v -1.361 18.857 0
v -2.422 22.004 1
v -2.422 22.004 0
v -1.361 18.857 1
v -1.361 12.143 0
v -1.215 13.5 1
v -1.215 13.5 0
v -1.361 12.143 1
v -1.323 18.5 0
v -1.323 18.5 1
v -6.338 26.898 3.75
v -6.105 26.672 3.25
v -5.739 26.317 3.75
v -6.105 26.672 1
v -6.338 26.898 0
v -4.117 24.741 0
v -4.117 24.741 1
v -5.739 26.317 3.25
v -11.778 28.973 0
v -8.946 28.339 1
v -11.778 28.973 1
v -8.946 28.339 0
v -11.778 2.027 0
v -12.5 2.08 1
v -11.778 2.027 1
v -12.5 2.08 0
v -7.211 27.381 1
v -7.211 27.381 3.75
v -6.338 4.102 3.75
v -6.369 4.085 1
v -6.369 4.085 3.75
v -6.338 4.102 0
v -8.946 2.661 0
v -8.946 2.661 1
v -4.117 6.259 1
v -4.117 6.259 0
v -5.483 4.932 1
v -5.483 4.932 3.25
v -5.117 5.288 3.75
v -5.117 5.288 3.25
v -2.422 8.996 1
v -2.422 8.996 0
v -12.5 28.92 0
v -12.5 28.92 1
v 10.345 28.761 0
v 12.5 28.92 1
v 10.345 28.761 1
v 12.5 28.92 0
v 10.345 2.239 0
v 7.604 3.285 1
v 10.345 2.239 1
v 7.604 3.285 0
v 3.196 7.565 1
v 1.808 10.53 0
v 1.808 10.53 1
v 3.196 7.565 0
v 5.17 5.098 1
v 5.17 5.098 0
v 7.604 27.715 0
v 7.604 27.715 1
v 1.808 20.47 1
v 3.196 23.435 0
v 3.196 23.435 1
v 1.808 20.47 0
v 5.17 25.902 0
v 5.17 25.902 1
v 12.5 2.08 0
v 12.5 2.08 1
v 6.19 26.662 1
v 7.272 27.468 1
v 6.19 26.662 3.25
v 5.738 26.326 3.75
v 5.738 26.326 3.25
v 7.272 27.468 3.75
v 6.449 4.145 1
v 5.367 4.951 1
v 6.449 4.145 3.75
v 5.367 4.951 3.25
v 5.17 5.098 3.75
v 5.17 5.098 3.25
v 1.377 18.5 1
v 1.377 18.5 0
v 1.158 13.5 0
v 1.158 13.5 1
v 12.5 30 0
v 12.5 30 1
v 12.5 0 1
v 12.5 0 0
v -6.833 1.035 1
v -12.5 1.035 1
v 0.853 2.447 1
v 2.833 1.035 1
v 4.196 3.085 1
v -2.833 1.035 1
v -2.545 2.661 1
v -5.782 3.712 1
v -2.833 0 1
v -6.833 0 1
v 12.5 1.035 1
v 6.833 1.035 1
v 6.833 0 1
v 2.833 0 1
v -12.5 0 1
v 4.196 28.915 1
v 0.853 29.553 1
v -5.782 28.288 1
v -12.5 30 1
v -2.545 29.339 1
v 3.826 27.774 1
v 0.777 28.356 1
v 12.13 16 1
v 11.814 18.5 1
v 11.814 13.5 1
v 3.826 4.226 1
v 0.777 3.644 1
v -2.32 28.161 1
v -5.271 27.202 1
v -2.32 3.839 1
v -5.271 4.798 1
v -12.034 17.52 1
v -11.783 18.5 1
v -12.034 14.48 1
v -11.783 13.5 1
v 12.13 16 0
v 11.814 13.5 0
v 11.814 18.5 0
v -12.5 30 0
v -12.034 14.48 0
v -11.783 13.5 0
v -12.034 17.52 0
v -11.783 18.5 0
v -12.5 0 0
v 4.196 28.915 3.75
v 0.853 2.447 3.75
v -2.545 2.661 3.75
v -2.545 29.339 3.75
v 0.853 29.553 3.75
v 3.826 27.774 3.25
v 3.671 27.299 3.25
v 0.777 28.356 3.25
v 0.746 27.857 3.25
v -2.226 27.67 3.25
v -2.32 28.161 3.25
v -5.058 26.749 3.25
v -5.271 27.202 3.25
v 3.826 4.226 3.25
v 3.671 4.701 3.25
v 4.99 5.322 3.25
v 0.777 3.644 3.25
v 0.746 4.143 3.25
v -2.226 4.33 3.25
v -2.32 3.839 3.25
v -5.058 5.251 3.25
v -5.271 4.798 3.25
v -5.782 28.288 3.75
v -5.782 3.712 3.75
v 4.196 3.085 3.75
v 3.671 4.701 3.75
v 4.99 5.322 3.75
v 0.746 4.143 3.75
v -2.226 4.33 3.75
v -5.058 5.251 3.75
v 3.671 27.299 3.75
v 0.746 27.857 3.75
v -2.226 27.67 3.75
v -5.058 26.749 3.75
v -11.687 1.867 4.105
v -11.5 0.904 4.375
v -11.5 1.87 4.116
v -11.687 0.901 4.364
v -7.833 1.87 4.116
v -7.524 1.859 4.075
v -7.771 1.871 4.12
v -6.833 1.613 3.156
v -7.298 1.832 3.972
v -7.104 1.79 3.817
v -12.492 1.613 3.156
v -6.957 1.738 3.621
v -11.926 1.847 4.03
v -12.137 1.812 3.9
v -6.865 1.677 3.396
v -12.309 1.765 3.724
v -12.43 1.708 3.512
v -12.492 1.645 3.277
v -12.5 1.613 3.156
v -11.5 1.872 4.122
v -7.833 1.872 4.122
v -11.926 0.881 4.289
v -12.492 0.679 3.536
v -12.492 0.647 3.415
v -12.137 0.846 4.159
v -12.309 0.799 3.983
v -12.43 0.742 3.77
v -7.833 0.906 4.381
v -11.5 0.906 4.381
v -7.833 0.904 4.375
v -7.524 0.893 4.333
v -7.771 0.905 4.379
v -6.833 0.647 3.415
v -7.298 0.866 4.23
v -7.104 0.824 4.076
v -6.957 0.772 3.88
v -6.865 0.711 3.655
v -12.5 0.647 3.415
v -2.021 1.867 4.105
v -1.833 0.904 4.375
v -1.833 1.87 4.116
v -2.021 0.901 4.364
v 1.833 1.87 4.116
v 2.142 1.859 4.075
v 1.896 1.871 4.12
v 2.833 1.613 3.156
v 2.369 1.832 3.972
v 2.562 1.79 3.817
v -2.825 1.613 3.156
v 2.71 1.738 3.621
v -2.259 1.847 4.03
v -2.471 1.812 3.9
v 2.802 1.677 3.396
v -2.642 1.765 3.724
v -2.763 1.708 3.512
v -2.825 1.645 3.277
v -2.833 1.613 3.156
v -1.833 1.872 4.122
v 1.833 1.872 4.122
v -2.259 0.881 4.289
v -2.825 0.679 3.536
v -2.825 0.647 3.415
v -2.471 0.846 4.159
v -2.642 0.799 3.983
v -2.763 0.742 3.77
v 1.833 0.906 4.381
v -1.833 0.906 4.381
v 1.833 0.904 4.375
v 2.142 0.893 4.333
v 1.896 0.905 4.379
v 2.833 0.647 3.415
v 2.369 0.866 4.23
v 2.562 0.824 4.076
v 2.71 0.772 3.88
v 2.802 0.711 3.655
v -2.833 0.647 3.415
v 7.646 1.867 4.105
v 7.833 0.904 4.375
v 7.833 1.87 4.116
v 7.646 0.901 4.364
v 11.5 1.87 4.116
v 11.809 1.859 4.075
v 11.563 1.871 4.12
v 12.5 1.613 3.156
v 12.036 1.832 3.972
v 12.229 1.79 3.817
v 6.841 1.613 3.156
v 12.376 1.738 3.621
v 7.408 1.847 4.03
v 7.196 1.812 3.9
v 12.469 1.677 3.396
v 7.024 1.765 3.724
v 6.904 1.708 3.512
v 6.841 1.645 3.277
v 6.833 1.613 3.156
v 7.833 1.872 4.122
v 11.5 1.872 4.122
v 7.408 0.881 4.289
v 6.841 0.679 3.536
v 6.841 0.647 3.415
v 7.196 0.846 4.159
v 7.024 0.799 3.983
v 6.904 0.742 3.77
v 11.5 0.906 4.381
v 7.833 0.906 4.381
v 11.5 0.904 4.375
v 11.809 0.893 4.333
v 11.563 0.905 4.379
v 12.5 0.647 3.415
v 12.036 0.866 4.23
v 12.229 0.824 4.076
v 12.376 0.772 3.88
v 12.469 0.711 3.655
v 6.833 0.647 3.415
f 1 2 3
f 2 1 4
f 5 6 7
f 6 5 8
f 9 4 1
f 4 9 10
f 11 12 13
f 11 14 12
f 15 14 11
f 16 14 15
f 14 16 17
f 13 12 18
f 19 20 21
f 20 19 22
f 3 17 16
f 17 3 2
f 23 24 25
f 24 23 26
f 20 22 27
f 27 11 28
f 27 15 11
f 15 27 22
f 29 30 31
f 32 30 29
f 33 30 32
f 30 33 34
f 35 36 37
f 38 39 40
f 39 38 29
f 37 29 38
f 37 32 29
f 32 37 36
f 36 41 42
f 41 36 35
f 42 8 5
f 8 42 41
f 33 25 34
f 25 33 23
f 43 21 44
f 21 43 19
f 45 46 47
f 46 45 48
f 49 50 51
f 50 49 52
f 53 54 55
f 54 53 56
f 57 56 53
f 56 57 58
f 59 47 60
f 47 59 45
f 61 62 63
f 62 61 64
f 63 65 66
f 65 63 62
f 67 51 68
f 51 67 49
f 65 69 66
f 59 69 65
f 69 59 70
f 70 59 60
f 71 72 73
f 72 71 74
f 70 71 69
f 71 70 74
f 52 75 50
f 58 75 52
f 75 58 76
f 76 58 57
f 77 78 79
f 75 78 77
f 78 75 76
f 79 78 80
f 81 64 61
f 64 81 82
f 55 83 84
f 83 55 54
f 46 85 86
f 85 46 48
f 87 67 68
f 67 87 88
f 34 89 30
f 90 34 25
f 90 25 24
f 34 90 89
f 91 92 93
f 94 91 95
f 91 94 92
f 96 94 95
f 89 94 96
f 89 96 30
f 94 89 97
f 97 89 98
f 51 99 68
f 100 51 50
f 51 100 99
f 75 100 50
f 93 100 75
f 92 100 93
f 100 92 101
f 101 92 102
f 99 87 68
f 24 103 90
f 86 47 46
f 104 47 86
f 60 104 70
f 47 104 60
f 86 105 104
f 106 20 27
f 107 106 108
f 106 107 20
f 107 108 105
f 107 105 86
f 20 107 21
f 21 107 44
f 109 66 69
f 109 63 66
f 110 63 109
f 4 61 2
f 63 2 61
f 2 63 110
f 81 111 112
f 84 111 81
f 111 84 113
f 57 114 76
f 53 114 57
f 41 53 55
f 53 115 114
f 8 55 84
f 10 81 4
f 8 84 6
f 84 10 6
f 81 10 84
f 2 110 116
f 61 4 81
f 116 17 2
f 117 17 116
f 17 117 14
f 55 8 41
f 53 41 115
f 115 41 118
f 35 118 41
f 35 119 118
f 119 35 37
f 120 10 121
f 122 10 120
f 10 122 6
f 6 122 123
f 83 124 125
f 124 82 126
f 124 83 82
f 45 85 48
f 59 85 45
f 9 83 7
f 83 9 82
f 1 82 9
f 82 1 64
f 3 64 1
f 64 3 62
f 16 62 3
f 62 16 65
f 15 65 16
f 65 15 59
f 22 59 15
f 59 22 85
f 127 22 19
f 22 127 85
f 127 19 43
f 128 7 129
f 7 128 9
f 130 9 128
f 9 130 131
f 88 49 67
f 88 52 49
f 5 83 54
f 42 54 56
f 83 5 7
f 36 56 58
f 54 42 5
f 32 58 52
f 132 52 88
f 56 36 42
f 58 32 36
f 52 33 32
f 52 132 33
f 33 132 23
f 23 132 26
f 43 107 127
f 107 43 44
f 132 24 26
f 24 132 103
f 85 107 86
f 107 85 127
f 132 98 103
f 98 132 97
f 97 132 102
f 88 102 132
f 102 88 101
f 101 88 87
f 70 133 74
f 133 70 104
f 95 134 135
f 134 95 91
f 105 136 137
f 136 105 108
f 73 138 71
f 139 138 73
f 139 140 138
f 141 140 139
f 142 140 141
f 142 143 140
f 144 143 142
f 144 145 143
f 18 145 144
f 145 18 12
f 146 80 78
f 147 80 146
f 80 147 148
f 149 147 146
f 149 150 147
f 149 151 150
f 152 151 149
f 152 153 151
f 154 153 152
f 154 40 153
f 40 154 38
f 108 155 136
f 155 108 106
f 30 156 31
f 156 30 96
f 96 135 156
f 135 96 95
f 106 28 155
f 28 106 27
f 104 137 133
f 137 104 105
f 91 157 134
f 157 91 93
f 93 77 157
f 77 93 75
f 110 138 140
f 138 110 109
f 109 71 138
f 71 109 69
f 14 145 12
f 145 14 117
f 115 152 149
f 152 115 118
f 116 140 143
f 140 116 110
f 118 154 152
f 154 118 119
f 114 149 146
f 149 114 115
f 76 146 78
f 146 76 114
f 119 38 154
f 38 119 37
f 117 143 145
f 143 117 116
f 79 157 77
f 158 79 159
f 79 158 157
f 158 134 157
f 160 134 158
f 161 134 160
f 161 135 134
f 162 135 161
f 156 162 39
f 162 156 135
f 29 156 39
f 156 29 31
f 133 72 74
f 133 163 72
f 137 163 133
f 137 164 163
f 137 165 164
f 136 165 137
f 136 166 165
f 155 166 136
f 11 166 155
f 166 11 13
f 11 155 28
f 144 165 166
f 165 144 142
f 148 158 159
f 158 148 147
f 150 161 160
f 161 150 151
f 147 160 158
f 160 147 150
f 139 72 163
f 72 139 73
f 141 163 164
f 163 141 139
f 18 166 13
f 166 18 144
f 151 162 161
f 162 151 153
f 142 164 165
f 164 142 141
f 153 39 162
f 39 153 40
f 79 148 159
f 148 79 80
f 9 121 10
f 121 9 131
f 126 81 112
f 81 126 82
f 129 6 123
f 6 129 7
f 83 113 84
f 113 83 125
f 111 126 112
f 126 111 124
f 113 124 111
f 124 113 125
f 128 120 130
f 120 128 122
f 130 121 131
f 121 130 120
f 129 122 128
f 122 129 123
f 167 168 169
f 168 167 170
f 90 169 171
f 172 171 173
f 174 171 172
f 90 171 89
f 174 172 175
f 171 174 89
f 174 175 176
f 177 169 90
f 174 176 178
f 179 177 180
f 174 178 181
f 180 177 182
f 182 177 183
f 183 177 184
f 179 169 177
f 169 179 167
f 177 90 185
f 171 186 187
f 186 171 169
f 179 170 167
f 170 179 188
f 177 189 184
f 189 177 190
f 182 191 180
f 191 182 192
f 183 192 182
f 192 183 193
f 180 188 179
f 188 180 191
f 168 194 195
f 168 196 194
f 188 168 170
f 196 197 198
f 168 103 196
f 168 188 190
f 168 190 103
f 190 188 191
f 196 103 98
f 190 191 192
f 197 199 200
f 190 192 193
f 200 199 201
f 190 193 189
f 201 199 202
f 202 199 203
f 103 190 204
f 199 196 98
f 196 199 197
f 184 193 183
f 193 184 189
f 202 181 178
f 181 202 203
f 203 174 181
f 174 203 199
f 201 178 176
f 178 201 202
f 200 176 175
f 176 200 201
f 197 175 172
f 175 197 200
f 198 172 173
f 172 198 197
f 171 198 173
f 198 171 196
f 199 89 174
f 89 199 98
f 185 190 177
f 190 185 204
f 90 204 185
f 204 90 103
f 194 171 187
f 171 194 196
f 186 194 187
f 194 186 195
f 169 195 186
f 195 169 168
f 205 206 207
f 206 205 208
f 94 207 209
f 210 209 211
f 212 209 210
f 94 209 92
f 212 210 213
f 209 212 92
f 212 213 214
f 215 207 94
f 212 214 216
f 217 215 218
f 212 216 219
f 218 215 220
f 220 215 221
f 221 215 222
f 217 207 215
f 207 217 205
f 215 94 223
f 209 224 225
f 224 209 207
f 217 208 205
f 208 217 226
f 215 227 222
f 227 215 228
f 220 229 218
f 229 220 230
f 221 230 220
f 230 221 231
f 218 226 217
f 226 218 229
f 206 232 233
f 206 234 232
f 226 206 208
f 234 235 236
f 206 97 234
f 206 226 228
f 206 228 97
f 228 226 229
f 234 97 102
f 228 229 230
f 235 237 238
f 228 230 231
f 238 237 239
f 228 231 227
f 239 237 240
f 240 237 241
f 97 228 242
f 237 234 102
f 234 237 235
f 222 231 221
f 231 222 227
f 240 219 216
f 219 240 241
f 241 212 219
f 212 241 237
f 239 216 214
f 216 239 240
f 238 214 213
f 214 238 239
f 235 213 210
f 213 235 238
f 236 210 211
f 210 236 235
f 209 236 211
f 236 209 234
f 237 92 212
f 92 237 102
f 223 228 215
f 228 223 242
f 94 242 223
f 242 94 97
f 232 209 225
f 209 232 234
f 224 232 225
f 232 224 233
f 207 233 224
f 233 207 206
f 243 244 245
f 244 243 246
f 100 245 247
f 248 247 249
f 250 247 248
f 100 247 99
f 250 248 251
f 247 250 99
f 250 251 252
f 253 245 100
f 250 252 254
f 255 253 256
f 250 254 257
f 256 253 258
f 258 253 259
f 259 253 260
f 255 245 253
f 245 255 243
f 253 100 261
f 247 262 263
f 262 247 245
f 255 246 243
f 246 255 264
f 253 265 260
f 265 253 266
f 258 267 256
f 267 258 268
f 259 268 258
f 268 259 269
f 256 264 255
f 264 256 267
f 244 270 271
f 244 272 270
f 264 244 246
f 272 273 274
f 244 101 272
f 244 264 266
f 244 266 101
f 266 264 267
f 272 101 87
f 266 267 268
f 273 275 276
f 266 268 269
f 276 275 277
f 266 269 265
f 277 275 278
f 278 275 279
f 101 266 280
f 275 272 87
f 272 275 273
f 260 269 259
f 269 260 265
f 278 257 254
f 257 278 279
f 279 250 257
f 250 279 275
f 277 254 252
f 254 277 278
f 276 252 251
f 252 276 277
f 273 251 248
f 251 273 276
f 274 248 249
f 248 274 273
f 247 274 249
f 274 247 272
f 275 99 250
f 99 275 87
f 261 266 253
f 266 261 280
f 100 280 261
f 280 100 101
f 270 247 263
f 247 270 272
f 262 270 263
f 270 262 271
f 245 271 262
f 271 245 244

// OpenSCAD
/*
 * Frameless Photo Stand, v2.0
 *
 * by Alex Franke (CodeCreations), Jun 2012
 * http://www.theFrankes.com
 * 
 * Licenced under Creative Commons Attribution - Non-Commercial - Share Alike 3.0 
 * 
 * DESCRIPTION: This is a simple parametric frameless photo stand that uses (with its 
 *   default values) only about 50mm of filament (about a penny) and holds up a photo
 *   for display without the use of a frame. 
 * 
 * INSTRUCTIONS: Choose some values in the "User-defined values" section, render,
 *   and print. If you want to render the object with a slot to hold a coin, use 
 *   the name of that coin from the list in "Some constant coin sizes," or define 
 *   your own size as [diameter,thickness]. For example, if you want to stack two 
 *   1-euro coins, use [23.25, 4.66] as the value. Be sure the base is sized to fit
 *   the coins. 
 * 
 * v1.0, Jun 9, 2012: Initial Release.
 * v2.0, Jun 19, 2012: Adds coin clip for added weight.
 * 
 * TODO: 
 *   * nothing yet...  
 */

/////////////////////////////////////////////////////////////////////////////
// Some constant coin sizes... 
/////////////////////////////////////////////////////////////////////////////

NONE   = [0,0];          EU_2E  = [25.75,2.2];    CA_2D  = [28,1.8];
                         EU_1E  = [23.25,2.33];   CA_1D  = [26.5,1.75];
US_1D  = [26.49,2];      EU_50C = [24.25,2.38];   CA_50C = [23.87,1.95];
US_50C = [30.61,2.15];   EU_20C = [22.25,2.14];   CA_25C = [23.88,1.58];
US_25C = [24.26,1.75];   EU_10C = [19.75,1.93];   CA_10C = [18.03,1.22];
US_10C = [17.91,1.35];   EU_5C  = [21.25,1.67];   CA_5C  = [21.2,1.76];
US_5C  = [21.21,1.95];   EU_2C  = [18.75,1.67];   CA_1C  = [19.05,1.45];
US_1C  = [19.05,1.55];   EU_1C  = [16.3,1.67];

AU_2D  = [20.5,3.2];
AU_1D  = [25,3];
AU_50C = [31.51,2];
AU_20C = [28.52,2.5];
AU_10C = [23.6,2];
AU_5C  = [19.41,1.3];


/////////////////////////////////////////////////////////////////////////////
// User-defined values... 
/////////////////////////////////////////////////////////////////////////////

baseThickness     = 1;          // The thickness of the base
baseWidth         = 25;         // The width of the base 
baseLength        = 30;         // The length of the base
coinSize          = US_25C;     // The coin to use, or [diameter,thickness]
coinClipPadding   = 0.5;        // The extra space built into to the coin clip
coinClipThickness = 1.2;        // The thickness of the coin slot 
coinSupportWidth  = 5;          // The width of the coin support surface
coinStopHeight    = 0.5;        // The width of the coin support surface
coinStopOverhang  = 0.5;        // The width of the coin support surface

baseSupportWidth  = 2;          // The minimal width of the support structure 

tabThickness      = 1.0;        // The thickness of each vertical "tab"
tabHeight         = 3.5;        // The height of the vertical tabs
tabRadius         = 1;          // The radius of the top corners of the tabs
tabSeparation     = 4;          // How far apart the tabs are 
tabAngle          = 75;         // The angle of the tabs (90 is vertical) 

$fn               = 25;         // Quality of circles 


/////////////////////////////////////////////////////////////////////////////
// Calculated values... 
/////////////////////////////////////////////////////////////////////////////

tabWidth = (baseWidth-(tabSeparation*2))/3;
sideCutoutWidth = (baseWidth-baseSupportWidth)/2;
sideCutoutLength = (baseLength-tabThickness-baseSupportWidth);


/////////////////////////////////////////////////////////////////////////////
// The code... 
/////////////////////////////////////////////////////////////////////////////

union() {

	// Base
	Base(baseLength, baseWidth, baseThickness, tabThickness, sideCutoutLength, sideCutoutWidth );
	
	// Coin clip 
	if ( coinSize[0] * coinSize[1] > 0 ) {
		translate([0,0,baseThickness])
		intersection() {
			translate([0,baseLength/2 + tabThickness,0])
			difference() {
				union() {
					difference() {
						// outer circle 
						cylinder(r=coinSize[0]/2 + coinClipPadding/2 + coinClipThickness, 
							h=coinSize[1] + coinClipPadding); 
						// inner circle cutout
						translate([0,0,-0.5]) 
							cylinder(r=coinSize[0]/2 + coinClipPadding/2, 
								h=coinSize[1] + coinClipPadding + 1); 
					}

					// coin stop 
					translate([0,0,coinSize[1]+coinClipPadding])
					difference() {
						// outer circle
						cylinder(r=coinSize[0]/2 + coinClipPadding/2 + coinClipThickness, h=coinStopHeight); 
						// inner circle cutout
						translate([0,0,-0.5]) 
							cylinder(r=coinSize[0]/2 + coinClipPadding/2 - coinStopOverhang, h=coinStopHeight+1); 
					}
				}

			}
			translate([0,0,-0.5]) 
				Base(baseLength, baseWidth, coinSize[1]+coinStopHeight+coinClipPadding+1, tabThickness, 
					sideCutoutLength, sideCutoutWidth );
		}

		// Coin support
		translate([0,baseLength/2 + tabThickness,baseThickness/2])
		intersection() {
			cube([coinSize[0],coinSupportWidth,baseThickness], center=true);
			cylinder(r=coinSize[0]/2, h=coinSize[1], center=true); 
		}
	}

	// Tabs
	translate([0,0,baseThickness]) 
		rotate([tabAngle-90,0,0]) 
			for( i=[-1,0,1] )
				translate([i*(baseWidth-tabWidth)/2,tabThickness/2,tabHeight/2]) 
					RoundedTab([tabWidth,tabThickness, tabHeight], tabRadius);
}


/////////////////////////////////////////////////////////////////////////////
// Modules... 
/////////////////////////////////////////////////////////////////////////////

module Base(length, width, thickness, tabThickness, cutoutLength, cutoutWidth ) {
	difference() {
		translate([0,length/2,thickness/2]) 
			cube([width, length, thickness], center = true);

		// Curved cutouts 
		for( i=[-1,1] ) {
			translate([i*width/2,tabThickness+((length-tabThickness)/2),-0.5]) 
				scale([1,cutoutLength/cutoutWidth/2,1]) 
					cylinder(h=thickness+1, r=cutoutWidth);
		}
	}
}

module RoundedTab( size, radius ) {
	union() {
		for( i=[-1,1] ){
			translate([i*((size[0]/2)-radius), 0, (size[2]/2)-radius]) 
				rotate([90,0,0]) 
					cylinder( h=size[1], r=radius, center=true ) ;
		}
		translate([0,0,-radius/2]) 
			cube([size[0], size[1], size[2]-radius], center=true);
		translate([0,0,0]) 
			cube([size[0]-radius*2, size[1], size[2]], center=true);
	}
}
